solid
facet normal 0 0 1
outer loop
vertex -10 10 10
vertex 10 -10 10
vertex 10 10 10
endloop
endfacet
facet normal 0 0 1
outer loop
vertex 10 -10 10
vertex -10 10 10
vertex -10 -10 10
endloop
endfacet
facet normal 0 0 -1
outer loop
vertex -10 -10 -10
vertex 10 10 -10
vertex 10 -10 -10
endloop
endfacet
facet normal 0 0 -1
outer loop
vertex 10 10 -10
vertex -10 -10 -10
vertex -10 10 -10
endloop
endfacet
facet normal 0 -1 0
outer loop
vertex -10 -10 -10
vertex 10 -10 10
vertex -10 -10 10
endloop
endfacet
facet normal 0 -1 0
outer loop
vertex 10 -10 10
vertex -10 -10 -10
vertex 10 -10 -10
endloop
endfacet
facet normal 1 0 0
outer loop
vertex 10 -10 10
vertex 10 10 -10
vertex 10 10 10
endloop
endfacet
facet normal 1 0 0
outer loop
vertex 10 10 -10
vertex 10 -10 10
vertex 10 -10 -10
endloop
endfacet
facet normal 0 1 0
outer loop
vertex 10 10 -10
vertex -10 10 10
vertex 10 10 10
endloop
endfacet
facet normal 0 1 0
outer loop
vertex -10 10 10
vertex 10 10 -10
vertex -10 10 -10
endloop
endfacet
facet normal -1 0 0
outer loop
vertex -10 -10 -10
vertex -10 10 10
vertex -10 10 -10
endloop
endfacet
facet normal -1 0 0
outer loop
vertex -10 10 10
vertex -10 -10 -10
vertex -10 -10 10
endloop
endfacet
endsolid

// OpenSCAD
/*
Calibration cube — 20 x 20 x 20 mm

Usage:
 - Render (F6) in OpenSCAD and export STL (File -> Export -> Export as STL),
   or use the included export script (`scripts/export_stl.ps1` on Windows,
   `scripts/export_stl.sh` on Linux/macOS).
 - Use this cube to check dimensional accuracy and basic extrusion/flow
   calibration: print it, then measure all three sides with calipers.

The cube is centered on the origin so it is easy to align on the build
plate in the slicer.
*/

/* [Dimensions] */
size = 20; // [10:1:30]

assert(size > 0, "size must be positive");

cube([size, size, size], center = true);
